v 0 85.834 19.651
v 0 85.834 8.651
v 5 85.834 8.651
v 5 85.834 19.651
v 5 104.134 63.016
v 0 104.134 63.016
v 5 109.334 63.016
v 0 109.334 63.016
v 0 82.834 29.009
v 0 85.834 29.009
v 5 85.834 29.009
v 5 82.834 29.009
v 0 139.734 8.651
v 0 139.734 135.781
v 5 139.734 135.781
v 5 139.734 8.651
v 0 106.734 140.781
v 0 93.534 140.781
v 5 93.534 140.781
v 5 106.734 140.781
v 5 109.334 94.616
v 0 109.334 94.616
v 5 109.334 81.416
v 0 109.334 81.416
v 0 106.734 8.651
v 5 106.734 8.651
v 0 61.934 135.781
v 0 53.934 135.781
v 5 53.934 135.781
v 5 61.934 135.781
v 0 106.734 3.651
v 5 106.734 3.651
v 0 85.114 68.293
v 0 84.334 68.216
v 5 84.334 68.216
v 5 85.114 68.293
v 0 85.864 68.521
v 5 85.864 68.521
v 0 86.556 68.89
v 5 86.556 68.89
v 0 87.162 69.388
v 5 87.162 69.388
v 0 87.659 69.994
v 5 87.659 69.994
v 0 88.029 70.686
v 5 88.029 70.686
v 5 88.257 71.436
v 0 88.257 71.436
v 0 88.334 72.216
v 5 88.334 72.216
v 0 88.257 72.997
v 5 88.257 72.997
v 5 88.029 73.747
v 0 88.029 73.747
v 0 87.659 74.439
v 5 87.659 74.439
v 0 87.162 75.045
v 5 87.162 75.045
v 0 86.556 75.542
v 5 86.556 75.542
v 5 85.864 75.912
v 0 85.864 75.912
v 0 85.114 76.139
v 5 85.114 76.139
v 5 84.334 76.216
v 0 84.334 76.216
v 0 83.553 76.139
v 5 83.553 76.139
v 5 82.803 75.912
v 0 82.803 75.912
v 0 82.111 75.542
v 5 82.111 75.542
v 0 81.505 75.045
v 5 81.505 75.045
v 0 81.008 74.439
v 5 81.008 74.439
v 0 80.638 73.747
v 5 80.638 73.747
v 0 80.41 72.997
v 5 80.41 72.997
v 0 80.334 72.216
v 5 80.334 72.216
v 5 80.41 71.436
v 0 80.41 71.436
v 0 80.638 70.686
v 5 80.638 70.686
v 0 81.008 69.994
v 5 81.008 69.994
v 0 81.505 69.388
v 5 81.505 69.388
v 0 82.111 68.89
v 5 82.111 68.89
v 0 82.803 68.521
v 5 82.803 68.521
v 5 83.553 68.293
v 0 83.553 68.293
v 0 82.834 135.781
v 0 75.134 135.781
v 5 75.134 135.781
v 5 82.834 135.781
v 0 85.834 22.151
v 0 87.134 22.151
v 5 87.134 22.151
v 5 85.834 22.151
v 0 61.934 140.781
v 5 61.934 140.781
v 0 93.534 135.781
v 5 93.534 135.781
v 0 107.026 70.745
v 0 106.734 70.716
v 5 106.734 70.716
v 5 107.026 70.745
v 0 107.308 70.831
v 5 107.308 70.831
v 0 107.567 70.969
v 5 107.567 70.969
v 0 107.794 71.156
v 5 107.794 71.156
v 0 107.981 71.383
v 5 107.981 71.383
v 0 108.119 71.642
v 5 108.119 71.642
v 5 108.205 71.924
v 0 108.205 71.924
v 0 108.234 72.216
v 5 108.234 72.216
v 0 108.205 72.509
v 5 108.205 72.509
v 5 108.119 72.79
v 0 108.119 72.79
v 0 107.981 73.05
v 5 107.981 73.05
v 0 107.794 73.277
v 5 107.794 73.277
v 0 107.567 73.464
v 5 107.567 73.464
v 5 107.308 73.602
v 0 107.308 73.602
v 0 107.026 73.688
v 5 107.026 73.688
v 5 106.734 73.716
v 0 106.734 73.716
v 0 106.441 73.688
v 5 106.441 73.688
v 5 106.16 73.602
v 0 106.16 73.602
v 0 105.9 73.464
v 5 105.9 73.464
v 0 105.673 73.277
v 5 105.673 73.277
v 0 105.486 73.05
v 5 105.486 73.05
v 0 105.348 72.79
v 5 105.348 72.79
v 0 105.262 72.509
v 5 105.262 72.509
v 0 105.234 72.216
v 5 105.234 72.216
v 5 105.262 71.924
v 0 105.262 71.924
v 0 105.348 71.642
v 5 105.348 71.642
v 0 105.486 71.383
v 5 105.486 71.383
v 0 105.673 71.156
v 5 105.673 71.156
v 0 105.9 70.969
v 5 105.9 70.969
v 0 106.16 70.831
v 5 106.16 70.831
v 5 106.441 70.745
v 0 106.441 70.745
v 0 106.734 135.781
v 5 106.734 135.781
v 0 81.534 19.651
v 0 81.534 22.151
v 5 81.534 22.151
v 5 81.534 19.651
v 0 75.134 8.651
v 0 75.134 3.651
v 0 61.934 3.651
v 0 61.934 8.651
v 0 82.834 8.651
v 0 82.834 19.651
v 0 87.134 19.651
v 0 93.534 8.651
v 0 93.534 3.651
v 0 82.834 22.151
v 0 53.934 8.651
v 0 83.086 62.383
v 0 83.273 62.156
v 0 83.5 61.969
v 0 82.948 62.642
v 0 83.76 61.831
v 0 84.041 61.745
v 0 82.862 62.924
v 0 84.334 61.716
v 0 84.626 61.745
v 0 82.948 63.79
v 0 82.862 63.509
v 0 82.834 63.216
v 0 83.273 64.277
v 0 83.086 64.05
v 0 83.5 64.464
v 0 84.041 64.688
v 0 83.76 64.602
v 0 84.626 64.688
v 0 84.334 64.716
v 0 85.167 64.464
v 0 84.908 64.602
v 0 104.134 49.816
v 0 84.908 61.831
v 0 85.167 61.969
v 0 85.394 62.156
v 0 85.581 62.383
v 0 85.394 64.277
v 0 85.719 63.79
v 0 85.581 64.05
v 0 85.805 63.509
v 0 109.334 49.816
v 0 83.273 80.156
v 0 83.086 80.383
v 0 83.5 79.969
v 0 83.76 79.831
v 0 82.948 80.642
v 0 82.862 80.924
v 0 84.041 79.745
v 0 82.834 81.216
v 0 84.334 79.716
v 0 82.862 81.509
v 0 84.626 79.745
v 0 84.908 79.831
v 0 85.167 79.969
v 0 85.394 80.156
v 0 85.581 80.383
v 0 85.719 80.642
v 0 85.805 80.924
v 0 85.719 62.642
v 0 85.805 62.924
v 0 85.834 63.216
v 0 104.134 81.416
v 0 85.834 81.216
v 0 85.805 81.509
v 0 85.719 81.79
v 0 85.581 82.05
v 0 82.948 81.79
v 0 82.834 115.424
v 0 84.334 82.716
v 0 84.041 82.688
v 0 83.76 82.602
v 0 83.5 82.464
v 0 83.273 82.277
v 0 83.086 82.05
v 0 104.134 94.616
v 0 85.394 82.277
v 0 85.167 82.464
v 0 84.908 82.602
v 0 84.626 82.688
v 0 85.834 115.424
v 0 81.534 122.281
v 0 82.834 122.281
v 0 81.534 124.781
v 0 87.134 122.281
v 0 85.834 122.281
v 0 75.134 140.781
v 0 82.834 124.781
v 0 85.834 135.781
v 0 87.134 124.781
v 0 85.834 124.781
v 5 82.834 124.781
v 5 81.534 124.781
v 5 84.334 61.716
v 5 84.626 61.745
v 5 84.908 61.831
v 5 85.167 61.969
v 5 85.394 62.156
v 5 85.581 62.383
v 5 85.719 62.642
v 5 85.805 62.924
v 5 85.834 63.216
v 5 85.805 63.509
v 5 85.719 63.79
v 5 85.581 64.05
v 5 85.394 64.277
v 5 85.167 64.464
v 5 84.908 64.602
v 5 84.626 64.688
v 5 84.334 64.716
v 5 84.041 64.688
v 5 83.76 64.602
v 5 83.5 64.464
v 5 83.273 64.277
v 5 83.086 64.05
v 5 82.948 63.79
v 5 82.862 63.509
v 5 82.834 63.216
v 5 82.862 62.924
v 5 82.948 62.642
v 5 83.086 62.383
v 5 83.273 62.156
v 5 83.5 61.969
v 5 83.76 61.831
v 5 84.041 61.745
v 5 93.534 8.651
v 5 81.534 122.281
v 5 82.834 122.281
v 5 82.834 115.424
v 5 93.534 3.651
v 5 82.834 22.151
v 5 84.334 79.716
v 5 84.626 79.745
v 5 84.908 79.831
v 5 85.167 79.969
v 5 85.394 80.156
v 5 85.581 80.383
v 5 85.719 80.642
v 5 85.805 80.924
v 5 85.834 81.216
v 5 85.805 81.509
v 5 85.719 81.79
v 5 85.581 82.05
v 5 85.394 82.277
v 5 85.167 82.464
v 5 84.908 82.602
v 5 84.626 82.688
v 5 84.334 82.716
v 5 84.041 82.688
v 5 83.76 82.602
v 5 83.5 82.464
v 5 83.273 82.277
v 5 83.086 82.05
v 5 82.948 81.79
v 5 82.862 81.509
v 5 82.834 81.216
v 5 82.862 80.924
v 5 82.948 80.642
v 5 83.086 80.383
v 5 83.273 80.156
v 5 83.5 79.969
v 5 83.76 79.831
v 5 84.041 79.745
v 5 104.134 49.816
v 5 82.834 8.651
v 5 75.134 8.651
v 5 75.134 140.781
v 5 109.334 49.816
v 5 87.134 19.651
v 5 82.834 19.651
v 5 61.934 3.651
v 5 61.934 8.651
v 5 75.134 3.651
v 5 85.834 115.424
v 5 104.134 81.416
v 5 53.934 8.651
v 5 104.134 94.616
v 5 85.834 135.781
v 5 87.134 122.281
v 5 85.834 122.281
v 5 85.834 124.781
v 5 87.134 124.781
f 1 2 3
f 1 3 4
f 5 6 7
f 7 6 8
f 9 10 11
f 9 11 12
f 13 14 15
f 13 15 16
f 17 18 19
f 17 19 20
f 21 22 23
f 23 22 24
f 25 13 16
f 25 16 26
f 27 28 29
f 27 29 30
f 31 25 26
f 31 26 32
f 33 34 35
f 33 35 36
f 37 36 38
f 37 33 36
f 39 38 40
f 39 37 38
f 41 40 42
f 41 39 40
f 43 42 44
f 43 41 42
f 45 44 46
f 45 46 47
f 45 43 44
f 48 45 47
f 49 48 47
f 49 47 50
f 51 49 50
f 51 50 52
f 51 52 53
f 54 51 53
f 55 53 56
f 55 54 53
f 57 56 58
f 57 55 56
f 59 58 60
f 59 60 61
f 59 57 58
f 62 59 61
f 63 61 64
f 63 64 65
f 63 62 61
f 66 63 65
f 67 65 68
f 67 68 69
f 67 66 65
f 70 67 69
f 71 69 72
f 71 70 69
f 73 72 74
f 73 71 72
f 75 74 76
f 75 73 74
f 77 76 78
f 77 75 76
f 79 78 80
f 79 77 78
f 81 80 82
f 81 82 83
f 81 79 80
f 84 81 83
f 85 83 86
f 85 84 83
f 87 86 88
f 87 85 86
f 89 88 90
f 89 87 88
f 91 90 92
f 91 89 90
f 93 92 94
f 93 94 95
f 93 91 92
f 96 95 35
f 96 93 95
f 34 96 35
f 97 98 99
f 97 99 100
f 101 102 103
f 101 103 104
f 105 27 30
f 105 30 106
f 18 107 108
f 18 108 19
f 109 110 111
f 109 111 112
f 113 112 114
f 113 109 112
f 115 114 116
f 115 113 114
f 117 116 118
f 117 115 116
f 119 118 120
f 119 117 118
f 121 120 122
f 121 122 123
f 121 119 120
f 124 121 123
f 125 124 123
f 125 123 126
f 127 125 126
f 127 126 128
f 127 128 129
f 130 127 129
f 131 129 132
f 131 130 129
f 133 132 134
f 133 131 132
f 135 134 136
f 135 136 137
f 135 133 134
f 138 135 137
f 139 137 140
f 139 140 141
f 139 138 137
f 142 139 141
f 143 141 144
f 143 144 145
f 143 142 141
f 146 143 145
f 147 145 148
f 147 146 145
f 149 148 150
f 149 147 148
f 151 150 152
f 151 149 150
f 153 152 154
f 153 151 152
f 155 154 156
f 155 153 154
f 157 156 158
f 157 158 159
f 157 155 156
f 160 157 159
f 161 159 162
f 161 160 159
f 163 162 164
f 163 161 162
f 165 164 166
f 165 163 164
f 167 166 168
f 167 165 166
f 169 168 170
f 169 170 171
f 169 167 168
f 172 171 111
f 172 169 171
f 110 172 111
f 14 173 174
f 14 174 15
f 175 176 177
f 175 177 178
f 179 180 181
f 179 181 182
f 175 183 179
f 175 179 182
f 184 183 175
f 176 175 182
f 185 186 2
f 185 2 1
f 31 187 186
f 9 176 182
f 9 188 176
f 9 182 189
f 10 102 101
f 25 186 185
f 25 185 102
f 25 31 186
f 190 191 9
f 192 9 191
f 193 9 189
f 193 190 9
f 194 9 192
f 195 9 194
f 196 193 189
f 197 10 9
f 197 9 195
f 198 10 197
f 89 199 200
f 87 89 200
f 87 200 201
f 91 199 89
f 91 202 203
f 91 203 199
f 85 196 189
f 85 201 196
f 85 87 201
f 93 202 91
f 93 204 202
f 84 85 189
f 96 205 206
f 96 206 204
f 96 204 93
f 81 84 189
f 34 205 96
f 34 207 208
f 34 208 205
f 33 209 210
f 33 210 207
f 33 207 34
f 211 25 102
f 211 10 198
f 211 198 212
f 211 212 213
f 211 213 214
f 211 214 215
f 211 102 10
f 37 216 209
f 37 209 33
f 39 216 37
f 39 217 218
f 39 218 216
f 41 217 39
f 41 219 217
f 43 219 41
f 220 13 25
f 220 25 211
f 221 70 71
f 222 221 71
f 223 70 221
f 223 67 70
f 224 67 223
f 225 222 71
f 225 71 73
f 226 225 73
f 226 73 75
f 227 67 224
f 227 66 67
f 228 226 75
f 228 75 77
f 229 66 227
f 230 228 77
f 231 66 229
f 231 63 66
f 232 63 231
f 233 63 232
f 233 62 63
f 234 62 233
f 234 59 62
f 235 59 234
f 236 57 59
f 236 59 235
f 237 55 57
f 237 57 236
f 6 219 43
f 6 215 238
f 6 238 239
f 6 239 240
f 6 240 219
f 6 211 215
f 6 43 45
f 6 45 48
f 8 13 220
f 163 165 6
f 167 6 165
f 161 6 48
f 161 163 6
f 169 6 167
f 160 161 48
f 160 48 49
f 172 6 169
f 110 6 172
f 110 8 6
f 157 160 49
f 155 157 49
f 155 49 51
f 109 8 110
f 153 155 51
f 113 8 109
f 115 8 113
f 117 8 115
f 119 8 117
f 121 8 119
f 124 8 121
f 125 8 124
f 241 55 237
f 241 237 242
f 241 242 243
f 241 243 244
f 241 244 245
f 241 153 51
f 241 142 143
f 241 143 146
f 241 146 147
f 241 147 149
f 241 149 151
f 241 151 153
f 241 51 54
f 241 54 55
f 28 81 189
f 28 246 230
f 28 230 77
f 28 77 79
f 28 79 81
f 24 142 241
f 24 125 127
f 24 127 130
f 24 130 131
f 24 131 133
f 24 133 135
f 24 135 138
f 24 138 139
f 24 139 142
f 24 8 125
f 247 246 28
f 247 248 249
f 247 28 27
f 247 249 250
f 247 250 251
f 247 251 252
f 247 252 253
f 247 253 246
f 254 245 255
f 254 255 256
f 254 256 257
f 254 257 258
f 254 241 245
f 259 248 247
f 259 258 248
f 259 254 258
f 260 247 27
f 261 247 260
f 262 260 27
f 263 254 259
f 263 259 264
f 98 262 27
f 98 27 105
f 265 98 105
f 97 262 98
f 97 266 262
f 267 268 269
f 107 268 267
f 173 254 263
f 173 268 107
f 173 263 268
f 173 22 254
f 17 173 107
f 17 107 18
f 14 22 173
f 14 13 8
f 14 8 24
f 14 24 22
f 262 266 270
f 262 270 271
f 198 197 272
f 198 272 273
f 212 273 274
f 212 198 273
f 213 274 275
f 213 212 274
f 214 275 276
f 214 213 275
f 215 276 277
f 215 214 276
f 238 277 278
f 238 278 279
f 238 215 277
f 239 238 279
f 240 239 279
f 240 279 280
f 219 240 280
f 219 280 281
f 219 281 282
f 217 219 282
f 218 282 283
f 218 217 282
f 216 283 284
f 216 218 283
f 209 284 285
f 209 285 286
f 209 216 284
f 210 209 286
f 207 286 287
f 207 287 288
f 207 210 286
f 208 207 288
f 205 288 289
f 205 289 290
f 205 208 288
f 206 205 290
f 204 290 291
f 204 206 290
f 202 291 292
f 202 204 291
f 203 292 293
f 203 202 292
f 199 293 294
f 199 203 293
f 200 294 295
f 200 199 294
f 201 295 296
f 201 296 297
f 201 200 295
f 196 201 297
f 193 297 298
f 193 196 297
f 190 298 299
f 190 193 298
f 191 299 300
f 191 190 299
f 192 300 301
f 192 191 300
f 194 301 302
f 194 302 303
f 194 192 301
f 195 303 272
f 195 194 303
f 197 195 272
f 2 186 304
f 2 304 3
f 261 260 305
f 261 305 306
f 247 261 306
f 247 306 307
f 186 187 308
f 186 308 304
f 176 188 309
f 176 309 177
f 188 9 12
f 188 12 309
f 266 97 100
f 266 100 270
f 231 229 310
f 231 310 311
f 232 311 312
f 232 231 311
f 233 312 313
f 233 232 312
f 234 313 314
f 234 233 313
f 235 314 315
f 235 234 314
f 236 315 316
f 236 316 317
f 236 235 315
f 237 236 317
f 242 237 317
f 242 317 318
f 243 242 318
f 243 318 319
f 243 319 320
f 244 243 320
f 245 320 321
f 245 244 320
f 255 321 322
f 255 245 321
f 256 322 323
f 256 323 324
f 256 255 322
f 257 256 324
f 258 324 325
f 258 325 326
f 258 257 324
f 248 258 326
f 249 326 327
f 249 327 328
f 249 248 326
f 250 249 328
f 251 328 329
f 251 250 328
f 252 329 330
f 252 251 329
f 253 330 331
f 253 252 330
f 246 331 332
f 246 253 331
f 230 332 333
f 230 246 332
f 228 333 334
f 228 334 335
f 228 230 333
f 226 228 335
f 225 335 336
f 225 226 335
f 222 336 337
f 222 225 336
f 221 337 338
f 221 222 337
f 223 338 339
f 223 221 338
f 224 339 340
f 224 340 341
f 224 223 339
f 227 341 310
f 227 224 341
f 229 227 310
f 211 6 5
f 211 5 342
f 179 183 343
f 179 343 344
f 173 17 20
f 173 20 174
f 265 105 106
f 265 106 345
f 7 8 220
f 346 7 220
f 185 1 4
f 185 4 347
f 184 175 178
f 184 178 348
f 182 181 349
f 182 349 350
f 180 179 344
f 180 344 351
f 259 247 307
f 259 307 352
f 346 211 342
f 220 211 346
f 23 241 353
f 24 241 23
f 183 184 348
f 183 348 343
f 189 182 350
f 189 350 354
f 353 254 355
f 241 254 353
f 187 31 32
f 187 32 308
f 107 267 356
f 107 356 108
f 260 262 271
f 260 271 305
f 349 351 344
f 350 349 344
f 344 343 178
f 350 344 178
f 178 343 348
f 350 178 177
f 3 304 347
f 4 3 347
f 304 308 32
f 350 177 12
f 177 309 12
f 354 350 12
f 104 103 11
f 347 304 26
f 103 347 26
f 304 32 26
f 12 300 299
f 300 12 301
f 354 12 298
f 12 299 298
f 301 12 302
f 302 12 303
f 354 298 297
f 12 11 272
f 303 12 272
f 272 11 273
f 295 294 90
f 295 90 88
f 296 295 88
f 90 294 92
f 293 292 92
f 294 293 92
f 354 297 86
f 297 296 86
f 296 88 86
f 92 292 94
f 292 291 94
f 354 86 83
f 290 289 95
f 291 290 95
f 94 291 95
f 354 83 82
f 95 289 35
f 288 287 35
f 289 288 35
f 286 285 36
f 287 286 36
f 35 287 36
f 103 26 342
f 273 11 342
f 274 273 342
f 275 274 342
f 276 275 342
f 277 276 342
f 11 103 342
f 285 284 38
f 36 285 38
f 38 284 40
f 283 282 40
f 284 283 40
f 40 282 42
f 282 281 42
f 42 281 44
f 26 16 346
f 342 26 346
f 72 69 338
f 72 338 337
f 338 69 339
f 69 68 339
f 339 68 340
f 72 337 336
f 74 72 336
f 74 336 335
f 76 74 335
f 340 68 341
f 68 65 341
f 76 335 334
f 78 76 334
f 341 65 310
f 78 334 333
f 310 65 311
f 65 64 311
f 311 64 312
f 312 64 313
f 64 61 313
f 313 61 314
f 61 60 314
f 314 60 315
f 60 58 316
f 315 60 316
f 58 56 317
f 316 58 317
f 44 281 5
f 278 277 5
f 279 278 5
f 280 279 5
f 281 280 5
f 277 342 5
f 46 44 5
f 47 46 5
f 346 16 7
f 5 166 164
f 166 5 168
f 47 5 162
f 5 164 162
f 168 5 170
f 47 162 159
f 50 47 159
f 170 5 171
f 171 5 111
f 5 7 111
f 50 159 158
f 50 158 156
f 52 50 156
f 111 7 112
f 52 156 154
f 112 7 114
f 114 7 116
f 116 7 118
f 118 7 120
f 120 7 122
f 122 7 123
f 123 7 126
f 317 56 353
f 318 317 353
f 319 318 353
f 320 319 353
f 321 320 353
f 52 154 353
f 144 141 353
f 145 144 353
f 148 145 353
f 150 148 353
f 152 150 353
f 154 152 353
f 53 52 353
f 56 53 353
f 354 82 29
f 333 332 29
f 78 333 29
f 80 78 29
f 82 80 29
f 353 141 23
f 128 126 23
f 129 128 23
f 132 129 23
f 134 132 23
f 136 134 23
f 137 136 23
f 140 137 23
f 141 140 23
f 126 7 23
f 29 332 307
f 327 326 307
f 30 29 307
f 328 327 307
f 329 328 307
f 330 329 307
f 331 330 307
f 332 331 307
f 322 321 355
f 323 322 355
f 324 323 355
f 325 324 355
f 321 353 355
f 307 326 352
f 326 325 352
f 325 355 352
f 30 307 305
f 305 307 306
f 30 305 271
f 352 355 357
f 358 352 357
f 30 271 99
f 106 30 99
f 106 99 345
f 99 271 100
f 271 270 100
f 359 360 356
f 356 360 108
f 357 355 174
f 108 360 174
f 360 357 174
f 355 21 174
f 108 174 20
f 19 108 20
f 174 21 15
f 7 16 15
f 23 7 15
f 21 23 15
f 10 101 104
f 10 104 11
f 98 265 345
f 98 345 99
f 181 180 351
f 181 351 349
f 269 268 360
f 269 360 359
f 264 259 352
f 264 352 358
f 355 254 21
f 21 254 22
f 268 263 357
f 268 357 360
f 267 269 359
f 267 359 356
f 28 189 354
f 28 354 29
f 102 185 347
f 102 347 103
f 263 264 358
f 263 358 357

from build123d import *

# Parameters (mm, degrees)
SKETCH1_R           = 4
SKETCH1_R_2         = 1.5
SKETCH1_W           = 13.2
SKETCH1_H           = 5.2
BOSS_EXTRUDE1_DEPTH = 5


with BuildPart() as part:
    # Sketch1 → Boss-Extrude1 (new body)
    with BuildSketch(Plane(origin=(0, 0, 0), x_dir=(0, 0, -1), z_dir=(1, 0, 0))):
        Polygon((-135.781354304, 106.733539226), (-135.781354304, 139.733539226), (-8.651354304, 139.733539226), (-8.651354304, 106.733539226), (-3.651354304, 106.733539226), (-3.651354304, 93.533539226), (-8.651354304, 93.533539226), (-8.651354304, 85.833539226), (-19.651354304, 85.833539226), (-19.651354304, 87.133539226), (-22.151354304, 87.133539226), (-22.151354304, 85.833539226), (-29.008589557, 85.833539226), (-29.008589557, 82.833539226), (-22.151354304, 82.833539226), (-22.151354304, 81.533539226), (-19.651354304, 81.533539226), (-19.651354304, 82.833539226), (-8.651354304, 82.833539226), (-8.651354304, 75.133539226), (-3.651354304, 75.133539226), (-3.651354304, 61.933539226), (-8.651354304, 61.933539226), (-8.651354304, 53.933539226), (-135.781354304, 53.933539226), (-135.781354304, 61.933539226), (-140.781354304, 61.933539226), (-140.781354304, 75.133539226), (-135.781354304, 75.133539226), (-135.781354304, 82.833539226), (-124.781354304, 82.833539226), (-124.781354304, 81.533539226), (-122.281354304, 81.533539226), (-122.281354304, 82.833539226), (-115.424119051, 82.833539226), (-115.424119051, 85.833539226), (-122.281354304, 85.833539226), (-122.281354304, 87.133539226), (-124.781354304, 87.133539226), (-124.781354304, 85.833539226), (-135.781354304, 85.833539226), (-135.781354304, 93.533539226), (-140.781354304, 93.533539226), (-140.781354304, 106.733539226), align=None)
        with Locations((-72.216354304, 84.333539226)):
            Circle(SKETCH1_R, mode=Mode.SUBTRACT)
        with Locations((-81.216354304, 84.333539226)):
            Circle(SKETCH1_R_2, mode=Mode.SUBTRACT)
        with Locations((-63.216354304, 84.333539226)):
            Circle(SKETCH1_R_2, mode=Mode.SUBTRACT)
        with Locations((-72.216354304, 106.733539226)):
            Circle(SKETCH1_R_2, mode=Mode.SUBTRACT)
        with Locations((-56.416354304, 106.733539226)):
            Rectangle(SKETCH1_W, SKETCH1_H, mode=Mode.SUBTRACT)
        with Locations((-88.016354304, 106.733539226)):
            Rectangle(SKETCH1_W, SKETCH1_H, mode=Mode.SUBTRACT)
    extrude(amount=BOSS_EXTRUDE1_DEPTH)


solid = part.part
